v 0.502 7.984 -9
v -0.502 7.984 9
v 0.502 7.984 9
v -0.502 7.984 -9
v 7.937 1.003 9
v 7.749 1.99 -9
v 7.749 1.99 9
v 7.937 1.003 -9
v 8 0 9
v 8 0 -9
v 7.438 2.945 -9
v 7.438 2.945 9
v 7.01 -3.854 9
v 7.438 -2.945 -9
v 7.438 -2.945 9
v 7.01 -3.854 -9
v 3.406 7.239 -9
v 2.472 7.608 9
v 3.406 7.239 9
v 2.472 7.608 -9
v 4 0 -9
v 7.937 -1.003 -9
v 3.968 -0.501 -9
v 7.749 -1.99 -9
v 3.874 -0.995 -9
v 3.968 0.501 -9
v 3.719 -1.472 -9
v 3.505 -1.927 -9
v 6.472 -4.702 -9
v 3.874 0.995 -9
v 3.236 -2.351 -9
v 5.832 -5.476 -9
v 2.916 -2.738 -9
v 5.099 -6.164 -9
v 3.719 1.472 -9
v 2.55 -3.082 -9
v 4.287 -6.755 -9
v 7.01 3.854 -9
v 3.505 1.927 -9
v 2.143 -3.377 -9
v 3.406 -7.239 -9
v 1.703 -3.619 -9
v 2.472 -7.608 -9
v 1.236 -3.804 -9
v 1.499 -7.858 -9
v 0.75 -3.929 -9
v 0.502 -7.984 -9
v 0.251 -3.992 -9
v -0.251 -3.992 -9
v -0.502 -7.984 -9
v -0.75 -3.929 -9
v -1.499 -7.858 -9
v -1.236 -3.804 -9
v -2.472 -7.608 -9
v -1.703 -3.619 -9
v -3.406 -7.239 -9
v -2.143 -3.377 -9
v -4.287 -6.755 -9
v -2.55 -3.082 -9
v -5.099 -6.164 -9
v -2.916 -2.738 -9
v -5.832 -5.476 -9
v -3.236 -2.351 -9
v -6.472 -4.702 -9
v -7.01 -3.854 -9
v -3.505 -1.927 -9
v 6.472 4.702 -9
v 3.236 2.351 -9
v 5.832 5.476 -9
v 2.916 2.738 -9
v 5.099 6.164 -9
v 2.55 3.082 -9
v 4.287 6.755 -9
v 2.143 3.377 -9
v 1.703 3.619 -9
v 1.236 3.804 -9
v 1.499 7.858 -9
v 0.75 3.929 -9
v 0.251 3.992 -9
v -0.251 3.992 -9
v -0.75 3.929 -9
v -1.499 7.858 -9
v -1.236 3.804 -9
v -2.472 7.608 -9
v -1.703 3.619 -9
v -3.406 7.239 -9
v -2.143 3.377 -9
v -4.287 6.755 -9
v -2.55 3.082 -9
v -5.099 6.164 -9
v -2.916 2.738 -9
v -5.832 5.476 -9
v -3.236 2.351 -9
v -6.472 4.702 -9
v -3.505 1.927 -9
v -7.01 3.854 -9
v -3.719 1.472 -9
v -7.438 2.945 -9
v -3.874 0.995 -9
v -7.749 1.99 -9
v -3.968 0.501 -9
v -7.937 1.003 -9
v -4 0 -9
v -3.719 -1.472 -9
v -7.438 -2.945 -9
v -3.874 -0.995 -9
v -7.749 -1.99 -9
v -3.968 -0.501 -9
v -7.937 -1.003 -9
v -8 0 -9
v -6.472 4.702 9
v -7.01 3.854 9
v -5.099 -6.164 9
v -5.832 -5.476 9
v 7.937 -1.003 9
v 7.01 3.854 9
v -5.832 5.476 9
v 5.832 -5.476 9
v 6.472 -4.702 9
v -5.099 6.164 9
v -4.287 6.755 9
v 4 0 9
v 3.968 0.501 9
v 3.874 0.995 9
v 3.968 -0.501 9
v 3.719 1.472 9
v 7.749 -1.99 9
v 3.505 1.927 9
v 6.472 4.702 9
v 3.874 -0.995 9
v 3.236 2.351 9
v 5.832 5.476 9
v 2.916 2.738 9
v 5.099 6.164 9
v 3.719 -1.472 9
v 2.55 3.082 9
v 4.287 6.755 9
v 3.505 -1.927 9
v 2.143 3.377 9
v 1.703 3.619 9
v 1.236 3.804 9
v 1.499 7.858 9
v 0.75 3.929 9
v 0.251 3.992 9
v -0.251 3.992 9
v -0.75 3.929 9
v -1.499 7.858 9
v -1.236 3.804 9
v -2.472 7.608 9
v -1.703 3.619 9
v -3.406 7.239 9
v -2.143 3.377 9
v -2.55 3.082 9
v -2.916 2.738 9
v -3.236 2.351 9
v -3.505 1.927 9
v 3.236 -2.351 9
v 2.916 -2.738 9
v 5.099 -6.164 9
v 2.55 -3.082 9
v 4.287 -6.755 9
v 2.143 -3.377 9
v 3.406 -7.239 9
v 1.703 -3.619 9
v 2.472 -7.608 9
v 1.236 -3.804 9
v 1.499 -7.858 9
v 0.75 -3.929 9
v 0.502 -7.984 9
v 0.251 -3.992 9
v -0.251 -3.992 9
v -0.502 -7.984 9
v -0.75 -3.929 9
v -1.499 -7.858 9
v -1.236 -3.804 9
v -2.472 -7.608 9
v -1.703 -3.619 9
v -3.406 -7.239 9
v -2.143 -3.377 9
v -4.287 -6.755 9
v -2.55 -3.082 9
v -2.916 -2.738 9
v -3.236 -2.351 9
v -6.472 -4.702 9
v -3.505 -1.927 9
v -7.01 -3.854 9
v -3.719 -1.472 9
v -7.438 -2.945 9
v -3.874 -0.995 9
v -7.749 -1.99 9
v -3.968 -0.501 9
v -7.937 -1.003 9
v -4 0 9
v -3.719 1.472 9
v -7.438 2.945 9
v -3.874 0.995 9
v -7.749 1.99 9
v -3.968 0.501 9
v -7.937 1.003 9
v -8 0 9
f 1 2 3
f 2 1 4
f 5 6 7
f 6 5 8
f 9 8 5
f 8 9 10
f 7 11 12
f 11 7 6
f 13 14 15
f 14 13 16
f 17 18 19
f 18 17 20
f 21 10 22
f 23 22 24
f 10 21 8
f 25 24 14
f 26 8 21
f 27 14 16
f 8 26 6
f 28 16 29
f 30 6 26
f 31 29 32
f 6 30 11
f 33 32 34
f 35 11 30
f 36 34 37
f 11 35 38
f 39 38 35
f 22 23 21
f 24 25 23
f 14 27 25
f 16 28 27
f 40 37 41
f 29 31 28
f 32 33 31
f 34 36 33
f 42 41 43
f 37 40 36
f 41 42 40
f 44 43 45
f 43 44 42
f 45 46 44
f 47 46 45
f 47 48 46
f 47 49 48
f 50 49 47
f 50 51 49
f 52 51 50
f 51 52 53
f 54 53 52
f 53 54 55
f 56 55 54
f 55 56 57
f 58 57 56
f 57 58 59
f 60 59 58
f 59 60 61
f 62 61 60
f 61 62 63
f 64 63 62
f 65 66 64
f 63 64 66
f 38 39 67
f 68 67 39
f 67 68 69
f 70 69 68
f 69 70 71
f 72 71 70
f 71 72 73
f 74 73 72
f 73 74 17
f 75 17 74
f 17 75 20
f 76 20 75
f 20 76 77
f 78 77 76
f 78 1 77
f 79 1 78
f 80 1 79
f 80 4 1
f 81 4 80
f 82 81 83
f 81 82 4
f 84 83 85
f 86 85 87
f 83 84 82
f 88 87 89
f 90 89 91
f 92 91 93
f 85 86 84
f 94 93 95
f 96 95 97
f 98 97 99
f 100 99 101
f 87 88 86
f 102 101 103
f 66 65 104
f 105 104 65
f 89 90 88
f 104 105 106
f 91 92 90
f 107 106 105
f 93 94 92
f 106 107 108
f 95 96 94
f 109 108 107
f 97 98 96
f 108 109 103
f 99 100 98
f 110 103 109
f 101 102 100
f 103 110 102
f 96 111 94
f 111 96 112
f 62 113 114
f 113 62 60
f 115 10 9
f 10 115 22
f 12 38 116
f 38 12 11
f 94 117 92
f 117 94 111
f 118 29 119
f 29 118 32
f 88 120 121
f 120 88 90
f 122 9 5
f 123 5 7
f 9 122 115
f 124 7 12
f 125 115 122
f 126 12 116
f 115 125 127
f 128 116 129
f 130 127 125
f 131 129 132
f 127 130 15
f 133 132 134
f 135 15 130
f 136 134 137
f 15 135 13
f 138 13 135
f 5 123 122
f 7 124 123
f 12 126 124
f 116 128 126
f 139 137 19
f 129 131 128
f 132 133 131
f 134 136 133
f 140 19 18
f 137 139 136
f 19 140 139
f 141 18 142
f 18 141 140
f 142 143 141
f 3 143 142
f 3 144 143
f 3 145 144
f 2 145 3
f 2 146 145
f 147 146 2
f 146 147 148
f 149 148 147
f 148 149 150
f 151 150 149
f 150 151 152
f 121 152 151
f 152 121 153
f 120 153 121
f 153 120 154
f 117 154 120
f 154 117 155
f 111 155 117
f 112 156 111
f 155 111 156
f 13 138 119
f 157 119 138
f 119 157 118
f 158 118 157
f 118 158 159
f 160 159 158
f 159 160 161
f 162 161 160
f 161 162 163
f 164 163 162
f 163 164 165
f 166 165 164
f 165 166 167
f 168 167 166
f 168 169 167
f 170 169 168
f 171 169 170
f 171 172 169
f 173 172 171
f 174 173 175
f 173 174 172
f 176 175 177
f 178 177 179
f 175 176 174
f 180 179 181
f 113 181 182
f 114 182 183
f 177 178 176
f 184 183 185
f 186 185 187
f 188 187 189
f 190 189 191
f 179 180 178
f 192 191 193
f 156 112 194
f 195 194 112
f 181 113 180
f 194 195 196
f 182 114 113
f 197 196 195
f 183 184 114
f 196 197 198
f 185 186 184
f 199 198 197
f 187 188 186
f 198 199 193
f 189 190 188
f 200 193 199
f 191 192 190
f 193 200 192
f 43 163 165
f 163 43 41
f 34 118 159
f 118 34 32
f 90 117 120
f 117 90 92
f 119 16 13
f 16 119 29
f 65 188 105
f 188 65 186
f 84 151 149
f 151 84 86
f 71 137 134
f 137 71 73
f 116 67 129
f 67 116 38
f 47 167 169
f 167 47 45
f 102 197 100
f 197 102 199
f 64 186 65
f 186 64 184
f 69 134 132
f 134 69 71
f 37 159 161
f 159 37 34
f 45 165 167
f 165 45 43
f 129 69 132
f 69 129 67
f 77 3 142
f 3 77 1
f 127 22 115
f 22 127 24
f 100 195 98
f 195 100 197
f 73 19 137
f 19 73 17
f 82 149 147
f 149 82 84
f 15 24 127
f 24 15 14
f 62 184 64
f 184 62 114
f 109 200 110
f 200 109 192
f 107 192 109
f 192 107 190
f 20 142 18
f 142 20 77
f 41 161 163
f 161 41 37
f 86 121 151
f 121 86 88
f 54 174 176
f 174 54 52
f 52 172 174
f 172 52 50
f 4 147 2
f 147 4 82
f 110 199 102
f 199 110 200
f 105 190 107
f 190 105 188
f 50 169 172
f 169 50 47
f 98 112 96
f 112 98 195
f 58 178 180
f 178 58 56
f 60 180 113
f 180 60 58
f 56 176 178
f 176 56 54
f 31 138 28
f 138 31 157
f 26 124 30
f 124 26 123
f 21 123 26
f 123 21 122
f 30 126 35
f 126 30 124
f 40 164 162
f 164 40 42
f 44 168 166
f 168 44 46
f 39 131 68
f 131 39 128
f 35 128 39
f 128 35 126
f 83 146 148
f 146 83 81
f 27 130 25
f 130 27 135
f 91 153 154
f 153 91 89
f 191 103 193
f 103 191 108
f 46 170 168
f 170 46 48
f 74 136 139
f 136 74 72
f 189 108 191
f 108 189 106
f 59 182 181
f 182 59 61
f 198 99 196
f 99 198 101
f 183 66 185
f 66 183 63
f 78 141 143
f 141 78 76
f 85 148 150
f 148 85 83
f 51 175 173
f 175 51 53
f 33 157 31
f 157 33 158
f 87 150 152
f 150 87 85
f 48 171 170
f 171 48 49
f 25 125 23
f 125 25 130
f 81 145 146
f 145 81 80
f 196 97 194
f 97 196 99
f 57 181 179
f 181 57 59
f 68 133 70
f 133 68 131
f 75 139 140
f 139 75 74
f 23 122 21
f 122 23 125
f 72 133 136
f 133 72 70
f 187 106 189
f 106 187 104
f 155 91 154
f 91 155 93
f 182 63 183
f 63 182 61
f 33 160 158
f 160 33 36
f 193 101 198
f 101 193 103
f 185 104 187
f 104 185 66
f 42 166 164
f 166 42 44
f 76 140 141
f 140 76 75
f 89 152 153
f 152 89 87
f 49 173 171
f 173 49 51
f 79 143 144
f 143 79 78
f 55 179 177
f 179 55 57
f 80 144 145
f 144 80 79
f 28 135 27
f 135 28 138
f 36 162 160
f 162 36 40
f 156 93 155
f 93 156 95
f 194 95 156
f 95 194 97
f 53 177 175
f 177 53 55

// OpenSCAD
$fn = 50;


difference() {
	union() {
		translate(v = [0, 0, -9.0000000000]) {
			cylinder(h = 18, r = 8.0000000000);
		}
	}
	union() {
		translate(v = [0, 0, -100.0000000000]) {
			cylinder(h = 200, r = 4.0000000000);
		}
	}
}
